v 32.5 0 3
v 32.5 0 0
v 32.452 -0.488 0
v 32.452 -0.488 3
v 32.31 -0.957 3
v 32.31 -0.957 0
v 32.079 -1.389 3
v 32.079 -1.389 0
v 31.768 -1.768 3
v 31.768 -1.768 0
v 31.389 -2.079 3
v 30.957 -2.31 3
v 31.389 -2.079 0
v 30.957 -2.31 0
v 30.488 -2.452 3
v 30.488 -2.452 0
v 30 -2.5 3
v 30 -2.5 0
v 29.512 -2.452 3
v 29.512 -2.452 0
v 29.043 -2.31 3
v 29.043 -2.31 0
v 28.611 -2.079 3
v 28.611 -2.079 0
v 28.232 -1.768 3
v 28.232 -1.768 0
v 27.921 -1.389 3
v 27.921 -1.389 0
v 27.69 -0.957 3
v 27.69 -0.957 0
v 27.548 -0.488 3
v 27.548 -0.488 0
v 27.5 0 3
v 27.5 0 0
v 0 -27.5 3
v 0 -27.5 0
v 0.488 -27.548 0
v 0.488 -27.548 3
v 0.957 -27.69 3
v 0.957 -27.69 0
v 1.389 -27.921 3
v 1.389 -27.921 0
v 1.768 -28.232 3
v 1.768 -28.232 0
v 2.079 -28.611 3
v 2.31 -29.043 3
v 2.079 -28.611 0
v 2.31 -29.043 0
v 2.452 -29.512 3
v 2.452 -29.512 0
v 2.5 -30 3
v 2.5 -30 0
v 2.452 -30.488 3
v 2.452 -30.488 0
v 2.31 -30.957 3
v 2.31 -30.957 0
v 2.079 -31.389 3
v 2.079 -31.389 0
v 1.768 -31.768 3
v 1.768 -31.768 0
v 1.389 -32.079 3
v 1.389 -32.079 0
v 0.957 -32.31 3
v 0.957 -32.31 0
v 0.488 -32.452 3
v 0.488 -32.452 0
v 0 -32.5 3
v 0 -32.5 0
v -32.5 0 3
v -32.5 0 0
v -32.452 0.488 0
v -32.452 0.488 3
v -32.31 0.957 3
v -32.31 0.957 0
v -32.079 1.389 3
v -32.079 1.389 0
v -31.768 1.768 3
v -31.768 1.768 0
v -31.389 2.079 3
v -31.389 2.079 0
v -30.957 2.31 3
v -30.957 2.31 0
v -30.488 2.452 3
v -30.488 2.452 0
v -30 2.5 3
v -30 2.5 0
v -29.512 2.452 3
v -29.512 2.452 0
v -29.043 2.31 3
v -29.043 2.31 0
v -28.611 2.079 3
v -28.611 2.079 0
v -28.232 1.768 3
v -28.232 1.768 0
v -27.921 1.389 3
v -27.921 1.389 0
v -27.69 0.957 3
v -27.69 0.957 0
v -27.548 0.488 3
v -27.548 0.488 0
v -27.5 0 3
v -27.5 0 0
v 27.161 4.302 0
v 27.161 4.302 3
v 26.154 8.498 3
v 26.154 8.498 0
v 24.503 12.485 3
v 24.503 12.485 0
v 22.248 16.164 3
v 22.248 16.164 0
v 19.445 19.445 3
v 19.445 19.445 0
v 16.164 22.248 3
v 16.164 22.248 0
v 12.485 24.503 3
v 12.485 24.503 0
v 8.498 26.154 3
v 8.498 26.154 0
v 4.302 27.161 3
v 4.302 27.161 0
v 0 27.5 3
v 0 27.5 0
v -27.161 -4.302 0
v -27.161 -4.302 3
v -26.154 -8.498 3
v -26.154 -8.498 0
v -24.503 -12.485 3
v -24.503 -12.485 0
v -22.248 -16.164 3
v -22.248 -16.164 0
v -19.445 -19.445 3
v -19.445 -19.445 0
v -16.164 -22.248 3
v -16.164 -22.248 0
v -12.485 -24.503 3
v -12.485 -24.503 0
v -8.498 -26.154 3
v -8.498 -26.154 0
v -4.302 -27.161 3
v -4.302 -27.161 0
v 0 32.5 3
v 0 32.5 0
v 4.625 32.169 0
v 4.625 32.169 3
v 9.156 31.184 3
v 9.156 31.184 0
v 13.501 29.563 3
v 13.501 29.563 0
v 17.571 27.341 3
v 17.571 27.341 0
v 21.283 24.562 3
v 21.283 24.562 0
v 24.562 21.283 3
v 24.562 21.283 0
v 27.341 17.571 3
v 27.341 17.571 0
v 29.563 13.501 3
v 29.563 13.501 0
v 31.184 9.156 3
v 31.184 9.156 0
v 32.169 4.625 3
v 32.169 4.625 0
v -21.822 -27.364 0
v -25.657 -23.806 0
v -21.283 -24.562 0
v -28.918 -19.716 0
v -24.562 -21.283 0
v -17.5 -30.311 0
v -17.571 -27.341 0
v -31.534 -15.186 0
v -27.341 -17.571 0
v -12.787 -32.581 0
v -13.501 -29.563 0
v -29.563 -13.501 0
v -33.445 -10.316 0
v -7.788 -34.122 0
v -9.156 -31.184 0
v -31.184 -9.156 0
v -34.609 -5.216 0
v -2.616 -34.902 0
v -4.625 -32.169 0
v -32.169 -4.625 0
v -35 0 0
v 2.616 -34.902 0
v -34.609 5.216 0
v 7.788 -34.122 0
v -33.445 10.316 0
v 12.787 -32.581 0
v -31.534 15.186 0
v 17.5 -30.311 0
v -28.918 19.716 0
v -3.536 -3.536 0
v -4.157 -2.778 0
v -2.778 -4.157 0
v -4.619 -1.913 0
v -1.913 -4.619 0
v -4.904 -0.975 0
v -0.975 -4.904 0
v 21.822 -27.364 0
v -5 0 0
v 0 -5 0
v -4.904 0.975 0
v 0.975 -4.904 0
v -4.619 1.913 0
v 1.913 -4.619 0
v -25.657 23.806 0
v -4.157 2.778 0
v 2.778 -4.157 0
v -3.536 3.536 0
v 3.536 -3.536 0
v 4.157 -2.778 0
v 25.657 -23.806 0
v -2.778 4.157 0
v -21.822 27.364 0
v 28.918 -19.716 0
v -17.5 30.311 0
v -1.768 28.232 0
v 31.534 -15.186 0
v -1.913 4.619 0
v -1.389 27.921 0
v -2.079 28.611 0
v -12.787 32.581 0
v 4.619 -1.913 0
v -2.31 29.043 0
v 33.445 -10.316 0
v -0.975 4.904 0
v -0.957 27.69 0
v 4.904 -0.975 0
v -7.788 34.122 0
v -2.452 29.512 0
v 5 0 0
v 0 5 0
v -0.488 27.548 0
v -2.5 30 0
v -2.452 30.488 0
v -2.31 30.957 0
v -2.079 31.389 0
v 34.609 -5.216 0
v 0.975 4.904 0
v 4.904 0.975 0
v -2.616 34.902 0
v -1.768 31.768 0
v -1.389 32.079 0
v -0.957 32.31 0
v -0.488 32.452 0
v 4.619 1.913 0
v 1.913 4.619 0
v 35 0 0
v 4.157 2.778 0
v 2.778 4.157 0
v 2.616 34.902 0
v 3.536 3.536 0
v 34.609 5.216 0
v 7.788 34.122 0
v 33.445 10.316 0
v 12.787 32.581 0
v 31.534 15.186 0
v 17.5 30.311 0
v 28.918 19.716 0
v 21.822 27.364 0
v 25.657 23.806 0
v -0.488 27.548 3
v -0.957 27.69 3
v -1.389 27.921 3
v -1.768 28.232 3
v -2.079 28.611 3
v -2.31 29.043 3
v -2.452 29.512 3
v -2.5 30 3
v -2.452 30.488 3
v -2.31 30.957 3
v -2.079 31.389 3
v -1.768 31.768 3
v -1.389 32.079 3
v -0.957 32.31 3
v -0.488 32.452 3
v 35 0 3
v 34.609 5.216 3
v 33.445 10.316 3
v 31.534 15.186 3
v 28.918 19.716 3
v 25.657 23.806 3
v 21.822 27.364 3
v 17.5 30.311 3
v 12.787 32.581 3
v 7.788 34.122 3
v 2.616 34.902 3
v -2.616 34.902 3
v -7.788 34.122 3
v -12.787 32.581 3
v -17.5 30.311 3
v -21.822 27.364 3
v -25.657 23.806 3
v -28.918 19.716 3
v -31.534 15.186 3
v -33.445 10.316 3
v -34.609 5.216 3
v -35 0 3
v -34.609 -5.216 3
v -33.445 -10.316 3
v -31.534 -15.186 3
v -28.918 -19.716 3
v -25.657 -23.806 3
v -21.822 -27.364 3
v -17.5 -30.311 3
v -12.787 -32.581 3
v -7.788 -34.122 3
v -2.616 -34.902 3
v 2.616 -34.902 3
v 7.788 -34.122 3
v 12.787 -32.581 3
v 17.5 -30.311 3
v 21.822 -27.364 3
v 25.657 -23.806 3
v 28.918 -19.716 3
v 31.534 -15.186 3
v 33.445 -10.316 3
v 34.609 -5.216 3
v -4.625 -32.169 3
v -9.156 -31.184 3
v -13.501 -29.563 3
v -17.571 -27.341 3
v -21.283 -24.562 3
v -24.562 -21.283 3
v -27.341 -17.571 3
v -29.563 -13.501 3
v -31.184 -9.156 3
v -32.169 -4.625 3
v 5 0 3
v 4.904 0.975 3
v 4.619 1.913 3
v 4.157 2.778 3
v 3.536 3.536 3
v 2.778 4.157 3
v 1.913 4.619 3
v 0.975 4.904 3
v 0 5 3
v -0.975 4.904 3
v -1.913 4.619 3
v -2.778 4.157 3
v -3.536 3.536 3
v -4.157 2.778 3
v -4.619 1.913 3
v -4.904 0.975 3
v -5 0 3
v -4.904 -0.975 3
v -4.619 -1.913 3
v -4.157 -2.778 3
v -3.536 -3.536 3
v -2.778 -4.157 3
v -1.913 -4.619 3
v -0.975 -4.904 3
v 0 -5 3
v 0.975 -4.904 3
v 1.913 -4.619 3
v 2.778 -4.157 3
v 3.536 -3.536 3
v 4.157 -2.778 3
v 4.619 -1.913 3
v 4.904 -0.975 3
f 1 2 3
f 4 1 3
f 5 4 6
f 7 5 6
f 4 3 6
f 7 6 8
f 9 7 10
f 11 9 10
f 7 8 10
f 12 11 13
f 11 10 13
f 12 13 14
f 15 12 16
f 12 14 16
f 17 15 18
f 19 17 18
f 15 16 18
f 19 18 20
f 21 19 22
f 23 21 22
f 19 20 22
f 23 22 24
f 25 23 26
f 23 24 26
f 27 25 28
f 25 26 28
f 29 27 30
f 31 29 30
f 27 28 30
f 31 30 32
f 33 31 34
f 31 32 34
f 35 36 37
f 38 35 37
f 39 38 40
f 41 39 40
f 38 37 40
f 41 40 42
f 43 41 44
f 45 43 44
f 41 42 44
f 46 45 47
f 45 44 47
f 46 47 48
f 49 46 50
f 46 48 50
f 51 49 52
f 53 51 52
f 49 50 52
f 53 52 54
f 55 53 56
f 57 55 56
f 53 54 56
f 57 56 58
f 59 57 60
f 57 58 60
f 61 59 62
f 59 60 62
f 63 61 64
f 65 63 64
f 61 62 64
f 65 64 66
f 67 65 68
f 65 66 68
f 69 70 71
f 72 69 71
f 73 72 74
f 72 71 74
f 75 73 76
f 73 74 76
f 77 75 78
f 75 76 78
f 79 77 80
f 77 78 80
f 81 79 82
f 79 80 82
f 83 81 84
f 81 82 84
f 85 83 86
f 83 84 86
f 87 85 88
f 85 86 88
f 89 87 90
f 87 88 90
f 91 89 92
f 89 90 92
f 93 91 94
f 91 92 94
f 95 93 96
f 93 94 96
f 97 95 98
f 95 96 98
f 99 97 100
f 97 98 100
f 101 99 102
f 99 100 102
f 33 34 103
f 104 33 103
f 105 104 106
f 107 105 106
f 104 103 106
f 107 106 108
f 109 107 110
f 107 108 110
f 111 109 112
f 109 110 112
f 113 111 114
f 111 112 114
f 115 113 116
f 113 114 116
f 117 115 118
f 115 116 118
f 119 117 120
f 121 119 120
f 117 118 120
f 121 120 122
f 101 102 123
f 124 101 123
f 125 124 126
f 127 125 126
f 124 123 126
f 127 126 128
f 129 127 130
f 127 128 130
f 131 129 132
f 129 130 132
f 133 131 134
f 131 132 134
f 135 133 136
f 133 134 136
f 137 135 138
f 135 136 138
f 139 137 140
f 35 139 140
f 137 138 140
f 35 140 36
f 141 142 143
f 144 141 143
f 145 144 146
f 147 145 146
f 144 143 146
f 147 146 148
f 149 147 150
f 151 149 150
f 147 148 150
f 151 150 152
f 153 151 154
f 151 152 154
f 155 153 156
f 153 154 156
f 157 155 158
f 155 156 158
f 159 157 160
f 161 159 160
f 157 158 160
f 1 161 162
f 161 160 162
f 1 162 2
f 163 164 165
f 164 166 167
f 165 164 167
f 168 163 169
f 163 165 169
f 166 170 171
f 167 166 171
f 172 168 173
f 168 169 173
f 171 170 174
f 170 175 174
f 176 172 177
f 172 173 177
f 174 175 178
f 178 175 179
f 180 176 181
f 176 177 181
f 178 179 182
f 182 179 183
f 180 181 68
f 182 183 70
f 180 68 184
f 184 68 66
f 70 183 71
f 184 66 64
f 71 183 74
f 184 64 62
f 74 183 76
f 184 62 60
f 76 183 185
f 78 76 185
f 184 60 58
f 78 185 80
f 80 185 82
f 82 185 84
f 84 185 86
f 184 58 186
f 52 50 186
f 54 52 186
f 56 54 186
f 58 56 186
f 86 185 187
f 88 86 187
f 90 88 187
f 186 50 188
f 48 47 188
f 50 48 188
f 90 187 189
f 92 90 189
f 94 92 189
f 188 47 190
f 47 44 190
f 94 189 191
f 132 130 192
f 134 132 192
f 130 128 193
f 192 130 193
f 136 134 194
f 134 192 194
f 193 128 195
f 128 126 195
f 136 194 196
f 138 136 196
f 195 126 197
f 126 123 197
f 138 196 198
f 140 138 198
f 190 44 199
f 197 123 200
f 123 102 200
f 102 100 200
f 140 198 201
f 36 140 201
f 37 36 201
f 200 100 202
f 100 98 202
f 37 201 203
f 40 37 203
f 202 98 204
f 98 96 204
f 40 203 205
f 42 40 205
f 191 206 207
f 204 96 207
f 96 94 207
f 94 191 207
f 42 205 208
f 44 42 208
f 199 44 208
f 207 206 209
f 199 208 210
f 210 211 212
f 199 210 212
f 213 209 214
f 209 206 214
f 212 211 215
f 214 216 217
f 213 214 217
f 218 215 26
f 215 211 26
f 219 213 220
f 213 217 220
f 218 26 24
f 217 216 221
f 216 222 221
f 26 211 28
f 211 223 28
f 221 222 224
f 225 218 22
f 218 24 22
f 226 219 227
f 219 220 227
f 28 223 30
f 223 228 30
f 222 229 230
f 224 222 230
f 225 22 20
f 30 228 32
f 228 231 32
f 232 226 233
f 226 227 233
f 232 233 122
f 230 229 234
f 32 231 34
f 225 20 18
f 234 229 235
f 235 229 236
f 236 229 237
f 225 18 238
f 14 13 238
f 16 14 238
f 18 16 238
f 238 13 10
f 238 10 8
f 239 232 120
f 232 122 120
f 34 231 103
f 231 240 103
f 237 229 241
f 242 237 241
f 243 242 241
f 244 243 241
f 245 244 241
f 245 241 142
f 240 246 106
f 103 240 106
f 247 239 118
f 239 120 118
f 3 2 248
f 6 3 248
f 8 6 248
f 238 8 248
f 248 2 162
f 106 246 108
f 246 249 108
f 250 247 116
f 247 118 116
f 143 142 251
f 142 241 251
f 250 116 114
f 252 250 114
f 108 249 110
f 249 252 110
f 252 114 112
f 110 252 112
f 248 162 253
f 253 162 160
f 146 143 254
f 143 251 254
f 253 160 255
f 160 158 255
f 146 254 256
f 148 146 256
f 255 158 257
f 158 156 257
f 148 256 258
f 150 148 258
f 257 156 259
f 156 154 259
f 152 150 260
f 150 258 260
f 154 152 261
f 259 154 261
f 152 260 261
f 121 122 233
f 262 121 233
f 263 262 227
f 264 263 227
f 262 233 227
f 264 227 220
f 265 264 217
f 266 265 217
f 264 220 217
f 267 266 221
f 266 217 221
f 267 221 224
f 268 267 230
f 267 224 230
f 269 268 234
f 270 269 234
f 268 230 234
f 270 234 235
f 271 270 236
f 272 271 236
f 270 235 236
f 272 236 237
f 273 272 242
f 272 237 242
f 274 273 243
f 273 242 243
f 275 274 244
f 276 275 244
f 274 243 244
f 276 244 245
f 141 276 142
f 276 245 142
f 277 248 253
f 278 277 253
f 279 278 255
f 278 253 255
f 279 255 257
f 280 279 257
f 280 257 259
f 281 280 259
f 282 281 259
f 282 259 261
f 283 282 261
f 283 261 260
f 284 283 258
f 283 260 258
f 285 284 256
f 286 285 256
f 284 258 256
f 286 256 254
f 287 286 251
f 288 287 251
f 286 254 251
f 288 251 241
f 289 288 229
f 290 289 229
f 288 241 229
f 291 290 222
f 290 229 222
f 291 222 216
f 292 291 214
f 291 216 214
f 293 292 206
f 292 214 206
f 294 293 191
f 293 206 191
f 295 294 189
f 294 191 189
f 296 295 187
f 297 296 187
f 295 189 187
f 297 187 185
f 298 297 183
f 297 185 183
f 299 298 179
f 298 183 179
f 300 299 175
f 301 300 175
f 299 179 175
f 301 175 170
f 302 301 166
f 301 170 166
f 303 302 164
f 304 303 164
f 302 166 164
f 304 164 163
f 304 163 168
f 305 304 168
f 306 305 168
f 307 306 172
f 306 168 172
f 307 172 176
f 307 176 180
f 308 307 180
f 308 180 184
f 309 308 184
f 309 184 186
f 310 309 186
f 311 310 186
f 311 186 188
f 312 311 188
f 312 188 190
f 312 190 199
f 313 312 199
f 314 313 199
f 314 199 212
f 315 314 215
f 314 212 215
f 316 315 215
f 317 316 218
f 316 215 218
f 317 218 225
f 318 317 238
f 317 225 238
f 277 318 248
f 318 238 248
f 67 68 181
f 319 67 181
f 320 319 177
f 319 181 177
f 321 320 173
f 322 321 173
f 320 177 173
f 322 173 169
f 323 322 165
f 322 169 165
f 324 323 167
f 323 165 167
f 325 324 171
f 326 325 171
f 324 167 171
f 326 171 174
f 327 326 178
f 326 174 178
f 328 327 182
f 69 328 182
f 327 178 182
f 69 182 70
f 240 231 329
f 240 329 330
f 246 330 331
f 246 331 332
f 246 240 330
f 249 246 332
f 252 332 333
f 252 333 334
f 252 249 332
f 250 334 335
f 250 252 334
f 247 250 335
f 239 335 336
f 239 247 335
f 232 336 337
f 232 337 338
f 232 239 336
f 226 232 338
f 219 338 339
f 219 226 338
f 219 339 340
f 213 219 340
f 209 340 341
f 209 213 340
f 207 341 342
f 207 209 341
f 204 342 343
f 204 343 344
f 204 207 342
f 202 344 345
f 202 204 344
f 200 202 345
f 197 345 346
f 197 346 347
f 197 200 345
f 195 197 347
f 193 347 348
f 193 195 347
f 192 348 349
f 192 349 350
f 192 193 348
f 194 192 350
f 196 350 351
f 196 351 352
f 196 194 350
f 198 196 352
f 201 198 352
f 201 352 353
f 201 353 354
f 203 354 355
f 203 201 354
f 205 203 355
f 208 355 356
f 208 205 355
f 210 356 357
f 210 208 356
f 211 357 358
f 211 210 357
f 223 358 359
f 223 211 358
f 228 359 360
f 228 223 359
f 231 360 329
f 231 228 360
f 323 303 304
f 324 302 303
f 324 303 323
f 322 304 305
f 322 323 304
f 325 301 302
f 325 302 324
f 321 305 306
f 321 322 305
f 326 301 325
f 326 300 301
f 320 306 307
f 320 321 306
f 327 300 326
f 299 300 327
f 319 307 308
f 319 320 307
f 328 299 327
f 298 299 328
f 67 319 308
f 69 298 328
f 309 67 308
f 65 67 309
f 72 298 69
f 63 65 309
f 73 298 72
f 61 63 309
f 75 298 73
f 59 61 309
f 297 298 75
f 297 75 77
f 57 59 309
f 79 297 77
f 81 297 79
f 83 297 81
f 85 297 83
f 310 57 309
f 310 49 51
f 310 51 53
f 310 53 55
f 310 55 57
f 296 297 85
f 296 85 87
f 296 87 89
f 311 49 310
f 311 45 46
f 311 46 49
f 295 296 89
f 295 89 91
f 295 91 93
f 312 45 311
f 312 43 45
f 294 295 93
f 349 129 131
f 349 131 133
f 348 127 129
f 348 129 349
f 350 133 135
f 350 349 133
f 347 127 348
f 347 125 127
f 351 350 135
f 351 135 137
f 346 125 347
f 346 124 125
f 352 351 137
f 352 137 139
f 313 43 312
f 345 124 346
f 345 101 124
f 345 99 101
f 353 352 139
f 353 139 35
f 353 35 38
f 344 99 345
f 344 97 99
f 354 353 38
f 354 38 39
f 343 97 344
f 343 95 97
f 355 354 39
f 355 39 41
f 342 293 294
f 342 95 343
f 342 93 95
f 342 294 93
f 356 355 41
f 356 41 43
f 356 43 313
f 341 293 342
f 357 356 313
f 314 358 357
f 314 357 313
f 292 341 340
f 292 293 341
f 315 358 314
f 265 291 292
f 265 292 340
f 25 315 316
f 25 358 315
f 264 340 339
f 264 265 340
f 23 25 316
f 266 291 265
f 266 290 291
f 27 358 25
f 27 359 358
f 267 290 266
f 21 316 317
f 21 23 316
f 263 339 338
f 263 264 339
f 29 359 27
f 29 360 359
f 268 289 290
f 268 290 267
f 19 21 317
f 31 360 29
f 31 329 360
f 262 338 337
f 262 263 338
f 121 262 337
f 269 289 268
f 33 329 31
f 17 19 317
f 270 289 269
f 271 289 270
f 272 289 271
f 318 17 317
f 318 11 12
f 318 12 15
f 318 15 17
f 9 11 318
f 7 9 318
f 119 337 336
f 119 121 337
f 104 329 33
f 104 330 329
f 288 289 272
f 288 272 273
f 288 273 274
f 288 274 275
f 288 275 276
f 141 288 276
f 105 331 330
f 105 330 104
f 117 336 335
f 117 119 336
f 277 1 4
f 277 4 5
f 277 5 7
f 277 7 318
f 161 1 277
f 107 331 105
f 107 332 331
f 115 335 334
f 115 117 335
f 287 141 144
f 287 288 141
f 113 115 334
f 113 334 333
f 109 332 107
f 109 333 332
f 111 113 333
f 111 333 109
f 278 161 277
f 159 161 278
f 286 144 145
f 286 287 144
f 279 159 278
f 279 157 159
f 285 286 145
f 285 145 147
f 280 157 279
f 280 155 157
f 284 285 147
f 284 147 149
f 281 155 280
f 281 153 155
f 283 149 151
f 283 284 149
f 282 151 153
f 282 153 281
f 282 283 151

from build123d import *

# Parameters (mm, degrees)
SKETCH_1_R      = 35
SKETCH_1_R_2    = 5
EXTRUDE_1_DEPTH = 3


with BuildPart() as part:
    # 스케치1 → 보스-돌출1 (new body)
    with BuildSketch(Plane.XY):
        Circle(SKETCH_1_R)
        with BuildLine():
            ThreePointArc((32.5, 0), (30, -2.5), (27.5, 0))
            ThreePointArc((27.5, 0), (19.445436483, 19.445436483), (0, 27.5))
            ThreePointArc((0, 27.5), (-2.5, 30), (0, 32.5))
            ThreePointArc((0, 32.5), (22.980970389, 22.980970389), (32.5, 0))
        make_face(mode=Mode.SUBTRACT)
        with BuildLine():
            ThreePointArc((0, -27.5), (2.5, -30), (0, -32.5))
            ThreePointArc((0, -32.5), (-22.980970405, -22.980970372), (-32.5, 4.6e-08))
            ThreePointArc((-32.5, 4.6e-08), (-29.999999977, 2.5), (-27.5, 0))
            ThreePointArc((-27.5, 0), (-19.445436483, -19.445436483), (0, -27.5))
        make_face(mode=Mode.SUBTRACT)
        Circle(SKETCH_1_R_2, mode=Mode.SUBTRACT)
    extrude(amount=EXTRUDE_1_DEPTH)


solid = part.part
